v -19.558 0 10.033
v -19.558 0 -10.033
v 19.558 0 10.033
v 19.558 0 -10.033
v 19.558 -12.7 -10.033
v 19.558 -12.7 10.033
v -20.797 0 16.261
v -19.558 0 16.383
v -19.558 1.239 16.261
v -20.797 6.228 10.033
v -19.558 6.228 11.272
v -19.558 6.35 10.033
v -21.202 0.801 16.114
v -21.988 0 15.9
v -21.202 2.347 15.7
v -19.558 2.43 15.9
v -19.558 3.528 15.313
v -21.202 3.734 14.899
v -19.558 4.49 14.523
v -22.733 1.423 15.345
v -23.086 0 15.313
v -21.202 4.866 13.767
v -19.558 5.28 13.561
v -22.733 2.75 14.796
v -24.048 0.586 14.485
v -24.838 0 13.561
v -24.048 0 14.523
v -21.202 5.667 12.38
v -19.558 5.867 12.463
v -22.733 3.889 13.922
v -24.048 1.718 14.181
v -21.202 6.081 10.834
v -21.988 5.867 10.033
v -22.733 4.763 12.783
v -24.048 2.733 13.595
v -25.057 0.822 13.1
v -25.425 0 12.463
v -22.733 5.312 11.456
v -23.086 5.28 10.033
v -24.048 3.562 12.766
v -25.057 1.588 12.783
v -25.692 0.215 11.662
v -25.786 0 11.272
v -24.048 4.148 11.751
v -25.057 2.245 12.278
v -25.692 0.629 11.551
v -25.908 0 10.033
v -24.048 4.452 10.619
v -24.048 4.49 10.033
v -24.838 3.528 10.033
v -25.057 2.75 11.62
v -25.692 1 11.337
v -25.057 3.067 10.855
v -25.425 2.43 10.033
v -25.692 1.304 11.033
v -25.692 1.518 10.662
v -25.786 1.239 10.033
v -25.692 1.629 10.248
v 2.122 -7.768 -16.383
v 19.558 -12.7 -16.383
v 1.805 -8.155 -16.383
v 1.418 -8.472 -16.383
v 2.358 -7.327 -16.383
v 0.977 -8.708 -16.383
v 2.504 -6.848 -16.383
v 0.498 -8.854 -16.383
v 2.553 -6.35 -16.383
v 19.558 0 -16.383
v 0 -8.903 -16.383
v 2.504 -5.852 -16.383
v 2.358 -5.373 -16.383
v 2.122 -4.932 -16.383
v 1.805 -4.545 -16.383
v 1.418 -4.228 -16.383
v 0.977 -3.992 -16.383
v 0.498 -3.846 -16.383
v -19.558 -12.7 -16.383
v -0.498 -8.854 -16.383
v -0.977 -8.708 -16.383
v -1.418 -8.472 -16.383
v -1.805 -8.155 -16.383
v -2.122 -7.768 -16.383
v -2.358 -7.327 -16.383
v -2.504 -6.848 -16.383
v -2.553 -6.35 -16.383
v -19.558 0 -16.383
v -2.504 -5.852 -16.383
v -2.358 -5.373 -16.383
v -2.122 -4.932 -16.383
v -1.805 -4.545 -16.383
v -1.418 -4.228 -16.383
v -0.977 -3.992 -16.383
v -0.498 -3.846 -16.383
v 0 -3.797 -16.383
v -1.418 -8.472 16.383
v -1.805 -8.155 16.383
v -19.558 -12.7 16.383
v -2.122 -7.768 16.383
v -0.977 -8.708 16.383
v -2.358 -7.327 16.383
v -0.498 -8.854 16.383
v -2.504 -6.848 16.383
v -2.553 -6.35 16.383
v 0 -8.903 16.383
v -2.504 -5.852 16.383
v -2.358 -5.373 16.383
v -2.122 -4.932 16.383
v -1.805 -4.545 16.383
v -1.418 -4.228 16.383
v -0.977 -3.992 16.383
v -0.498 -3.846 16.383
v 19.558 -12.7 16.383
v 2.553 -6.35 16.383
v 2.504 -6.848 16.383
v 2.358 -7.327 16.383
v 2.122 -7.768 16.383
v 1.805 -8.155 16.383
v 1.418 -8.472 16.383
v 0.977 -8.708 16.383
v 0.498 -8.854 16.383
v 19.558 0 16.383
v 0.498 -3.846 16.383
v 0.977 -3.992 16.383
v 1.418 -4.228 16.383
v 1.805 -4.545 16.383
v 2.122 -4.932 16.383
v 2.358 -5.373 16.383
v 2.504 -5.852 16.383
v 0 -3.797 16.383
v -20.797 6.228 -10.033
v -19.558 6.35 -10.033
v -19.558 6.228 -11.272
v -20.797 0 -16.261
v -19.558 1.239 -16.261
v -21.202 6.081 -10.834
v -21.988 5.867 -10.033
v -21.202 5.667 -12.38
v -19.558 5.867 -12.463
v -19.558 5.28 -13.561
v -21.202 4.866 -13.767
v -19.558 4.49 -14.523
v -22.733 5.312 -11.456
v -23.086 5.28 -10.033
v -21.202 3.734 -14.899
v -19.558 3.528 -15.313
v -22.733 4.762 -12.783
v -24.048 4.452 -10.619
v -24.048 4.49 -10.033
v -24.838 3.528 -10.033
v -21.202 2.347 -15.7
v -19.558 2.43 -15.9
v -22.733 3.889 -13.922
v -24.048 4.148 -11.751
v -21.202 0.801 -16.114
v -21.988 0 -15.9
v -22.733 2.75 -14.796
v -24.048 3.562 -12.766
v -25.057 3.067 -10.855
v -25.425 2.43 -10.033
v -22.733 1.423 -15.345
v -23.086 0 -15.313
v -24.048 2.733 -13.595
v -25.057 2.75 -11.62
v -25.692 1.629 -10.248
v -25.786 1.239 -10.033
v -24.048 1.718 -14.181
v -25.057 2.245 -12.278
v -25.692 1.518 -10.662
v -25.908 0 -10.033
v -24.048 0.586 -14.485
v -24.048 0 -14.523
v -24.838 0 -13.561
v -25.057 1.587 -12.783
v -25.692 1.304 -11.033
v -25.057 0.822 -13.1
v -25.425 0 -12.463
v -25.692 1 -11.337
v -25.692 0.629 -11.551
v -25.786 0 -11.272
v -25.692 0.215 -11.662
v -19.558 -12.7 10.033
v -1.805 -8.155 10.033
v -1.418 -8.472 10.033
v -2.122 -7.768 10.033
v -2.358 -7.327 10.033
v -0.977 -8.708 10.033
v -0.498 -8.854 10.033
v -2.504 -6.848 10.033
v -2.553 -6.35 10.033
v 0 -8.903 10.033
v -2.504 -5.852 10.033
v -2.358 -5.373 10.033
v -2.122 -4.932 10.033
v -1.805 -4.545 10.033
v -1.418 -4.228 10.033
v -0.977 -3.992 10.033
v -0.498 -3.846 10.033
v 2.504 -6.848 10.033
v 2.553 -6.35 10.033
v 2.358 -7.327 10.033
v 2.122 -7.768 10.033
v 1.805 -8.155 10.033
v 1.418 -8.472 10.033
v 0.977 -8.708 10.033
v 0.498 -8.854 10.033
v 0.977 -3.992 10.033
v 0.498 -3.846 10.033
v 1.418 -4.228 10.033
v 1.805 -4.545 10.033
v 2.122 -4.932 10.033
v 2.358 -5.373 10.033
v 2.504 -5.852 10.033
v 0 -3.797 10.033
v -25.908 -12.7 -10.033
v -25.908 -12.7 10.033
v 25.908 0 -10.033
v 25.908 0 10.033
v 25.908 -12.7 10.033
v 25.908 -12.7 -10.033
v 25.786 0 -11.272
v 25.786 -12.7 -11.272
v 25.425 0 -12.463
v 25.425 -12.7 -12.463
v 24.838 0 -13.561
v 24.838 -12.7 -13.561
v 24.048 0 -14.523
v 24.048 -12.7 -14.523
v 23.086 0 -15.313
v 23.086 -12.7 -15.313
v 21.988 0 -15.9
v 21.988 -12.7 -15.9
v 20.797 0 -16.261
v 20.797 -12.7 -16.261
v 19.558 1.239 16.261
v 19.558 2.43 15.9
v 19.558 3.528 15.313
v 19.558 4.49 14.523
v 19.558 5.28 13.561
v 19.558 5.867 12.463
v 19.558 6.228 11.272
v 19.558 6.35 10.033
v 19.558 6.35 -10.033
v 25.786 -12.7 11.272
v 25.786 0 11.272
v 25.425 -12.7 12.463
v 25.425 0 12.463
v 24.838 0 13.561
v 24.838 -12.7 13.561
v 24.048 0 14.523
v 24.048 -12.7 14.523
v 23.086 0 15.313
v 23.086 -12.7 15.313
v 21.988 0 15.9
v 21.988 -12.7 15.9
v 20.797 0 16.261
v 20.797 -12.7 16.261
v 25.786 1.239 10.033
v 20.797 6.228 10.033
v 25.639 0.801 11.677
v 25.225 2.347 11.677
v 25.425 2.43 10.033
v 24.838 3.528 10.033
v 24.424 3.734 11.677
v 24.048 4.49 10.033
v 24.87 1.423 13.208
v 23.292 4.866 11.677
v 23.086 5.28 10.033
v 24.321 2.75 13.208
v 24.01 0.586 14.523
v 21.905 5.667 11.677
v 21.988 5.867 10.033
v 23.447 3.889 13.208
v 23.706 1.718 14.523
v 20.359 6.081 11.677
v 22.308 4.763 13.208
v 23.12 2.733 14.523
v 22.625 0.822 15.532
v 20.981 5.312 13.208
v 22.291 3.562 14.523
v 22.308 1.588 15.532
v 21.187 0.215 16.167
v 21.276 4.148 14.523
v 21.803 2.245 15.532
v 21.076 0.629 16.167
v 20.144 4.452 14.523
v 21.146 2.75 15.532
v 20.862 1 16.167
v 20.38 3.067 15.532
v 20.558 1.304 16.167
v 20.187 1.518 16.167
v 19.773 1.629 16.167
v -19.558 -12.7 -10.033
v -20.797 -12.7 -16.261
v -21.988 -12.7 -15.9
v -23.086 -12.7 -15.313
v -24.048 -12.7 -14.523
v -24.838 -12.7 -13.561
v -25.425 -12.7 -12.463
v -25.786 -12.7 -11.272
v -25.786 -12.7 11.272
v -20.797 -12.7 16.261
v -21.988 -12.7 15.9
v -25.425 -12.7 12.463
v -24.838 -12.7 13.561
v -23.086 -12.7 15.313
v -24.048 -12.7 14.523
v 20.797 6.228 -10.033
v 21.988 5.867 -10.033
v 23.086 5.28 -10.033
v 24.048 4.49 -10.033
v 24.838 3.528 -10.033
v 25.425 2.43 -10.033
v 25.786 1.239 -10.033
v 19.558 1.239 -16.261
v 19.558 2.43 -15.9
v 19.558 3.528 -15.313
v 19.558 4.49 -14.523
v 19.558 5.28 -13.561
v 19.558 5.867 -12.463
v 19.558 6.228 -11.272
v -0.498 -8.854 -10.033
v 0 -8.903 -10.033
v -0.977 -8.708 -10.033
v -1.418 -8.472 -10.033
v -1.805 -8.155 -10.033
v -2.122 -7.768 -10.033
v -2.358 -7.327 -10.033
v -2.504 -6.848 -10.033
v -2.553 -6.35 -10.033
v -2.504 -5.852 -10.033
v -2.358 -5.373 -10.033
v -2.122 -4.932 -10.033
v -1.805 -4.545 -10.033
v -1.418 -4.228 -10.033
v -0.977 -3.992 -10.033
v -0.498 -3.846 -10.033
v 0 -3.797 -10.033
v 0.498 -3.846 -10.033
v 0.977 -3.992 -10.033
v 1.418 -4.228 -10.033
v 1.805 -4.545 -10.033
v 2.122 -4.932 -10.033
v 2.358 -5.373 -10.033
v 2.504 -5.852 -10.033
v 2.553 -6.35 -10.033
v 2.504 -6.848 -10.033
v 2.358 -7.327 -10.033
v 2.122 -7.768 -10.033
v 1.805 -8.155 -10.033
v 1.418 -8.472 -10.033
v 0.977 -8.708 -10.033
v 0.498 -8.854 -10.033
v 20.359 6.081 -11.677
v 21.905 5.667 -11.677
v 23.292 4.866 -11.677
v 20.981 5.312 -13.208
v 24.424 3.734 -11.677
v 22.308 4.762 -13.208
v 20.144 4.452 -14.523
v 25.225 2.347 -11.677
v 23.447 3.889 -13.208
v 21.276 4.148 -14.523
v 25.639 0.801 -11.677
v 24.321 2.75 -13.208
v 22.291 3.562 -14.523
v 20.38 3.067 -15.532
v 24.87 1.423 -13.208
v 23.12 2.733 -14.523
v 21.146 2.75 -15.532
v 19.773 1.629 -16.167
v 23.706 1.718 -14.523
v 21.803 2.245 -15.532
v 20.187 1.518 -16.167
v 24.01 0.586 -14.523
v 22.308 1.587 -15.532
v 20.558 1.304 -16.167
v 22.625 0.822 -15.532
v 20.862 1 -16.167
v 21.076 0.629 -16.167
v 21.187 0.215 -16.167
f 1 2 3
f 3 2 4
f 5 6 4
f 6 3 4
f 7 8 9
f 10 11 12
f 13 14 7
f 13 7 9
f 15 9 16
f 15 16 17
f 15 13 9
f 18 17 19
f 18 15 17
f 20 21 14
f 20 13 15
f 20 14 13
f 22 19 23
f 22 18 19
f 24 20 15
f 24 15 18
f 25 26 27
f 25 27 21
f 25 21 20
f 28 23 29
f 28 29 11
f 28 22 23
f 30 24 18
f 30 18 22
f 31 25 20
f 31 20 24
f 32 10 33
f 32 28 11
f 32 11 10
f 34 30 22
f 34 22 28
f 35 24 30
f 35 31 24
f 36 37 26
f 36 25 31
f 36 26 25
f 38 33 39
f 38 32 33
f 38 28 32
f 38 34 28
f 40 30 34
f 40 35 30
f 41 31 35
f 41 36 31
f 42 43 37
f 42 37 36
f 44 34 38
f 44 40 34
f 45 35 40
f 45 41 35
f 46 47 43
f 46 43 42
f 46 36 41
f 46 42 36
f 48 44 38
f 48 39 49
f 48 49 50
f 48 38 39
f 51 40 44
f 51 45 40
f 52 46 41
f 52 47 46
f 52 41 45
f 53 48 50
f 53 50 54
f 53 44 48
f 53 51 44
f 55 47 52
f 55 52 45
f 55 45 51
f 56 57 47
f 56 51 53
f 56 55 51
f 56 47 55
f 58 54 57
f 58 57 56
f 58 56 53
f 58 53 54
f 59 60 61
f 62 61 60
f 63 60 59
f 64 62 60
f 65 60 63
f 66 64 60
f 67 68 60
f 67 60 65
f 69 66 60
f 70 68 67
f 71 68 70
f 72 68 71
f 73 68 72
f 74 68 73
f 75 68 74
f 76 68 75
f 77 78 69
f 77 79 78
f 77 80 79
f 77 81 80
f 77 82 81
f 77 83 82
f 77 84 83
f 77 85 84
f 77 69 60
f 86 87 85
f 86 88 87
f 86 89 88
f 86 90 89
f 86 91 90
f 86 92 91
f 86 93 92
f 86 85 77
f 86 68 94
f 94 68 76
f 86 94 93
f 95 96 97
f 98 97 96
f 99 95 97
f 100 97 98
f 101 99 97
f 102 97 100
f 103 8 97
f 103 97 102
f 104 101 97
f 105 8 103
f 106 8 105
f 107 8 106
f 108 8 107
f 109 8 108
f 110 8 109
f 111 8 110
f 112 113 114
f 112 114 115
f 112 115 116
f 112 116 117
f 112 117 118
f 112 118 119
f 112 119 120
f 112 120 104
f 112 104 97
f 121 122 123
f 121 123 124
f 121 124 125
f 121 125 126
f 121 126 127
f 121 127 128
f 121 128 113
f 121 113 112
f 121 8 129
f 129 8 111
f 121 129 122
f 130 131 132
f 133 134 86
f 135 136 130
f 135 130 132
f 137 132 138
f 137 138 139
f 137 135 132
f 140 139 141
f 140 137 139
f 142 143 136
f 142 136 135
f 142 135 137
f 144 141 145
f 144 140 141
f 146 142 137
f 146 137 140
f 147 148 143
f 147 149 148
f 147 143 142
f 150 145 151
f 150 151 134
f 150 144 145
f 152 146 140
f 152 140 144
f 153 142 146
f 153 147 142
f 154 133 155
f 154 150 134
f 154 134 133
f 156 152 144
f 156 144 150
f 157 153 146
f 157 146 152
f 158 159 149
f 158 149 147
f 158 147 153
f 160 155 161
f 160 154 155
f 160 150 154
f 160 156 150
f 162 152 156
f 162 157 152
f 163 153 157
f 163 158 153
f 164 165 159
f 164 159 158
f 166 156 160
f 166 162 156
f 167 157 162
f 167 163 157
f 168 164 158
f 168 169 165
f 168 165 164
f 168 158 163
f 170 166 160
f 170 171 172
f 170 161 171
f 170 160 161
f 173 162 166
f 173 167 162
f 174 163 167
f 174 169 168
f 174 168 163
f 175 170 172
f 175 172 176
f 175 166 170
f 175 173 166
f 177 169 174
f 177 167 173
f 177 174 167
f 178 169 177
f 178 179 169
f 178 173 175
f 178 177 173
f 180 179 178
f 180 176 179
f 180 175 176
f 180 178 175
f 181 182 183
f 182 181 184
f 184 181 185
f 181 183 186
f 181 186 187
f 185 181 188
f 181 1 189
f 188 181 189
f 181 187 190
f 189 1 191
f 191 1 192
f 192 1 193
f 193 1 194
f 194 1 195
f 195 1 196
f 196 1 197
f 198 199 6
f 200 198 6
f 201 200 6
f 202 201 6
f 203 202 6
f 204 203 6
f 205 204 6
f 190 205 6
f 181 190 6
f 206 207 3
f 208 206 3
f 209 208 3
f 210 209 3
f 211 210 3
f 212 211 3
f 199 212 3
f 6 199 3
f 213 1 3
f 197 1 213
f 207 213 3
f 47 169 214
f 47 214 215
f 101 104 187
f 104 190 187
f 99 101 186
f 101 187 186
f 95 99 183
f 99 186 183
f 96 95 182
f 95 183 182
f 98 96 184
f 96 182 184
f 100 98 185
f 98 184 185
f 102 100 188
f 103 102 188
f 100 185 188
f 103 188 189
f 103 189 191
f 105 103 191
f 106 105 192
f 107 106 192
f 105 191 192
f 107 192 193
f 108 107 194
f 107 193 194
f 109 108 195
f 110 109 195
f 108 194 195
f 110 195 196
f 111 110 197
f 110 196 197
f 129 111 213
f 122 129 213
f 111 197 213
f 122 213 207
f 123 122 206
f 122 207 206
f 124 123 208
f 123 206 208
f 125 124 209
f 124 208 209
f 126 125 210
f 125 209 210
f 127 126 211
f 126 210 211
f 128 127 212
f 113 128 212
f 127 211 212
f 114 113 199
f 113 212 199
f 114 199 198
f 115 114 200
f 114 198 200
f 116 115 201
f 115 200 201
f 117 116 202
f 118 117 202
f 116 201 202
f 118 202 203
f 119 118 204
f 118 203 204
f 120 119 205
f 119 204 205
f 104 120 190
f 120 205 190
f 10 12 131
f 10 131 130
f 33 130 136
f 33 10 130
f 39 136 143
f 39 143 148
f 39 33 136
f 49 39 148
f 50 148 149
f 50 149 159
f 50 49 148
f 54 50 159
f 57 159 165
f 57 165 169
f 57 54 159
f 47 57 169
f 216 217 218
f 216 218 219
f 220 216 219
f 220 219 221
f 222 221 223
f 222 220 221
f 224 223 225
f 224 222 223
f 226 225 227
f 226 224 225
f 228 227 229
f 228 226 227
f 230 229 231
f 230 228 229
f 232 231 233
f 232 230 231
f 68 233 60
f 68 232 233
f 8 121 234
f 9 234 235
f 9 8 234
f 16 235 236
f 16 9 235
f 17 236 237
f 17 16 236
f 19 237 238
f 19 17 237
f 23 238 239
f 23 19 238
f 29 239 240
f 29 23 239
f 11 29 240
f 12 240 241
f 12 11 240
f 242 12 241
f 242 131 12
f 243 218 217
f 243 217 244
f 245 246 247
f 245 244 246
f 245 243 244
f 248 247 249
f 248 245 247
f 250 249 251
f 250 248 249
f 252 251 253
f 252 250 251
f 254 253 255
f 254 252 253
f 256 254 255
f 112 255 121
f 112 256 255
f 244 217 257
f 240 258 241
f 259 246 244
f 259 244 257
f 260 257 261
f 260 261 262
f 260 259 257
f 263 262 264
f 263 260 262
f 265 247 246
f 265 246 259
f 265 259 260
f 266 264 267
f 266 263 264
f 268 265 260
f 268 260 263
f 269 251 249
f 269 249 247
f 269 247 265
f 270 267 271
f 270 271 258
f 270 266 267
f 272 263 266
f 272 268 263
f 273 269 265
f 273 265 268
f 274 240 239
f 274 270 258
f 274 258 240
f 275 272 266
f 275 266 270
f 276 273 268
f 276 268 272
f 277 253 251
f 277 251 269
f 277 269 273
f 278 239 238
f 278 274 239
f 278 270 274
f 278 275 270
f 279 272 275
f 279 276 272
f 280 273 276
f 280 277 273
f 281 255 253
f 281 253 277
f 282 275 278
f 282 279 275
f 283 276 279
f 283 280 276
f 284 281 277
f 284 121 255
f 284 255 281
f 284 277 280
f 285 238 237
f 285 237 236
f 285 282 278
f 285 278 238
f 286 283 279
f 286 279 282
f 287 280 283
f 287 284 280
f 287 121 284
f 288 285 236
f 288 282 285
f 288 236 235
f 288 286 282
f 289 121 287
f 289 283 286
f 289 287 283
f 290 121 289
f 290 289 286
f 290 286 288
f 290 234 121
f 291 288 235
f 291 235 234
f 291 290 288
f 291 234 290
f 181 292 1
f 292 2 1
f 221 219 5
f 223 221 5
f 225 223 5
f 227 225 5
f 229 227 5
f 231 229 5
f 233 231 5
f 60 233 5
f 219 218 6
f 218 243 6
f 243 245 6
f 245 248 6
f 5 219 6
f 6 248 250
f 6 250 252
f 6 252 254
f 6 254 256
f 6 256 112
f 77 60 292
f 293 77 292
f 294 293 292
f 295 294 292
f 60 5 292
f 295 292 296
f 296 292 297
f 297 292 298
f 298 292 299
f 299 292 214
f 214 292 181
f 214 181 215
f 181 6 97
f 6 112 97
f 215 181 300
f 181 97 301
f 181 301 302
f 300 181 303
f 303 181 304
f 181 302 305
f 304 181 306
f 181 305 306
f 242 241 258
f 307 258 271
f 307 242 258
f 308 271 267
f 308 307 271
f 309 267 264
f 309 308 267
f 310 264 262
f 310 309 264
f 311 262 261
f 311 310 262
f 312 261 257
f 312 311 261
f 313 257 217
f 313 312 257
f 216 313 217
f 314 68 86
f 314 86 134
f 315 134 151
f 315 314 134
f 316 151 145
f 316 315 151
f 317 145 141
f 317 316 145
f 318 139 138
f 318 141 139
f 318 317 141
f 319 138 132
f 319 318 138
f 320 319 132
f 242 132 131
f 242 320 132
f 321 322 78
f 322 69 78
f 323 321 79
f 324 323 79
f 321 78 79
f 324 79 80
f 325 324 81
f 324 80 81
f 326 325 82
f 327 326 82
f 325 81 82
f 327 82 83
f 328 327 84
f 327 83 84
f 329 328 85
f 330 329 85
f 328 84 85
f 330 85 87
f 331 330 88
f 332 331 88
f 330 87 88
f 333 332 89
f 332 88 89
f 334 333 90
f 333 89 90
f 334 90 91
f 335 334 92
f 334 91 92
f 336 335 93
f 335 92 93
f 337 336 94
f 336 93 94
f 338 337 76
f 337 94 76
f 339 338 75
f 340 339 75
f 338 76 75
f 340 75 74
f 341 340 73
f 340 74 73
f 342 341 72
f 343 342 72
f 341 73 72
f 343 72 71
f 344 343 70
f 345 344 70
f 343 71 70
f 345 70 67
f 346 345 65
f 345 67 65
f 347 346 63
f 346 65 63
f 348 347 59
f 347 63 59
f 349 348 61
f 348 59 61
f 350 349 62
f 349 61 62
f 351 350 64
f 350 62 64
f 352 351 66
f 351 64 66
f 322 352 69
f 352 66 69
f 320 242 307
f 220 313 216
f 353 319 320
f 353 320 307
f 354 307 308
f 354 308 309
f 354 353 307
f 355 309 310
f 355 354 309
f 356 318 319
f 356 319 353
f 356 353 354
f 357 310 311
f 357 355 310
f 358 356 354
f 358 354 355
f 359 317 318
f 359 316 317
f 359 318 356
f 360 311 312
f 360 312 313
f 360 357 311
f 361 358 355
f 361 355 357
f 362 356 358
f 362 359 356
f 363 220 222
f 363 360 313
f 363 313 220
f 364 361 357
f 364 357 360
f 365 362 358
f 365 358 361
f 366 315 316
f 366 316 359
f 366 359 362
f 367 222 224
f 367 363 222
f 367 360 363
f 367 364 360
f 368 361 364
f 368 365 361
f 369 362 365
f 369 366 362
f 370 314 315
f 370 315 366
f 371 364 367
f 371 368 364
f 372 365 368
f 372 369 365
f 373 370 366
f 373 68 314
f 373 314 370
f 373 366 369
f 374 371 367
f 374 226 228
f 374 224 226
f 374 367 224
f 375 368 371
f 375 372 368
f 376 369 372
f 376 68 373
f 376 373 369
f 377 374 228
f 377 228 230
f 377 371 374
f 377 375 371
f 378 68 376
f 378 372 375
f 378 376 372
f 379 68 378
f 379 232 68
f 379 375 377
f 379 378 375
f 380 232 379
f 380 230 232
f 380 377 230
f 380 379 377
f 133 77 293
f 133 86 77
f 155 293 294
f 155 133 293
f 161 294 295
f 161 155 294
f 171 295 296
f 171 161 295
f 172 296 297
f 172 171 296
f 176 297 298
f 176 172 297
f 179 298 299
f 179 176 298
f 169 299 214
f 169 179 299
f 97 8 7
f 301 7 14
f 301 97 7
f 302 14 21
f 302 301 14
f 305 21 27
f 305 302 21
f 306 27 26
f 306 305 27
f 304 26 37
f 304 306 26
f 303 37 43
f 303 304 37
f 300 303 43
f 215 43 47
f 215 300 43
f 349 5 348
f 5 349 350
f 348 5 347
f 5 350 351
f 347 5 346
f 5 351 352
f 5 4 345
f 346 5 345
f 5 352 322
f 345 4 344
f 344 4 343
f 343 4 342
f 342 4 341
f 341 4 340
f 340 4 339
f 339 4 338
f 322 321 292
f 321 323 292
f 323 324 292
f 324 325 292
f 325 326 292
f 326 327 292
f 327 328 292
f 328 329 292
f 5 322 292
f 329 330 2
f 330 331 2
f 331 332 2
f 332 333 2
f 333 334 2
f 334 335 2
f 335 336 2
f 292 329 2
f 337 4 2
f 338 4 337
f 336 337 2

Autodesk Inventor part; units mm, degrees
ref_plane "YZ Plane" through (0, 0, 0) normal (1, 0, 0) x (0, 1, 0)
ref_plane "XZ Plane" through (0, 0, 0) normal (0, 1, 0) x (-1, 0, 0)
ref_plane "XY Plane" through (0, 0, 0) normal (0, 0, 1) x (1, 0, 0)
sketch "Sketch1" plane through (0, 0, 0) normal (0, 1, 0) x (-1, 0, 0)
  line L0 (19.558, 10.033) -> (-19.558, 10.033)
  line L1 (-19.558, 10.033) -> (-19.558, -10.033)
  line L2 (-19.558, -10.033) -> (19.558, -10.033)
  line L3 (19.558, -10.033) -> (19.558, 10.033)
  line L4 (19.558, 10.033) -> (-19.558, -10.033) construction
  line L5 (-19.558, 10.033) -> (19.558, -10.033) construction
  line L6 (25.908, 16.383) -> (-25.908, 16.383)
  line L7 (-25.908, 16.383) -> (-25.908, -16.383)
  line L8 (-25.908, -16.383) -> (25.908, -16.383)
  line L9 (25.908, -16.383) -> (25.908, 16.383)
  line L10 (25.908, 16.383) -> (-25.908, -16.383) construction
  line L11 (-25.908, 16.383) -> (25.908, -16.383) construction
  point P0 (0, 0)
  dimension "d0" = 20.066
  dimension "d1" = 39.116
  dimension "d2" = 6.35
  dimension "d3" = 6.35
extrude "Extrusion1" add sketch "Sketch1" against normal blind 12.7
sketch "Sketch2" plane through (0, 0, 0) normal (0, 1, 0) x (1, 0, 0)
  line L0 (25.908, -16.383) -> (-25.908, -16.383) projected
  line L1 (-25.908, 16.383) -> (25.908, 16.383) projected
  line L2 (-25.908, -16.383) -> (25.908, -16.383)
  line L3 (25.908, -16.383) -> (25.908, 16.383)
  line L4 (25.908, 16.383) -> (-25.908, 16.383)
  line L5 (-25.908, 16.383) -> (-25.908, -16.383)
  point P0 (0, 0)
extrude "Extrusion2" add sketch "Sketch2" along normal blind 6.35
fillet "Fillet1" radius 6.35 4 edges at (0, 6.35, 16.383) (25.908, 6.35, 0) (0, 6.35, -16.383) (-25.908, 6.35, 0)
fillet "Fillet2" radius 6.35 8 edges at (24.0481, 4.4901, 14.5231) (25.908, -6.35, 16.383) (24.0481, 4.4901, -14.5231) (25.908, -6.35, -16.383) (-24.0481, 4.4901, 14.5231) (-25.908, -6.35, 16.383) (-24.0481, 4.4901, -14.5231) (-25.908, -6.35, -16.383)
sketch "Sketch3" plane through (-19.558, -12.7, 16.383) normal (0, 0, 1) x (1, 0, 0)
  line L0 (0, 0) -> (-6.35, 0) construction
  line L1 (45.466, 12.7) -> (39.116, 12.7) construction
  line L2 (0, 0) -> (39.116, 12.7) construction
  line L3 (39.116, 12.7) -> (39.116, 0) construction
  line L4 (0, 19.05) -> (0, 12.7) construction
  line L5 (39.116, 0) -> (0, 12.7) construction
  point P0 (19.558, 12.7)
  point P1 (19.558, 6.35)
hole "Hole1" at (0, -6.35, 16.383) direction (0, 0, -1) diameter 5.1054 end through all clearance for "Hex Machine Screw" size "#10" standard "Ansi Unified Screw Threads"
equation "\"d0\" = width + 2 * printerError"
equation "\"d1\" = length + 2 * printerError"
equation "\"d2\" = wallThickness"
equation "\"d3\" = wallThickness"
equation "\"d4\" = heightFromTop"
equation "\"d6\" = thicknessAboveTopOfPost"
equation "\"width\" = 19.05"
equation "\"length\" = 38.1"
equation "\"heightFromTop\" = 12.7"
equation "\"thicknessAboveTopOfPost\" = 6.35"
equation "\"printerError\" = 0.508"
equation "\"wallThickness\" = 6.35"
properties part number "PostCap"
